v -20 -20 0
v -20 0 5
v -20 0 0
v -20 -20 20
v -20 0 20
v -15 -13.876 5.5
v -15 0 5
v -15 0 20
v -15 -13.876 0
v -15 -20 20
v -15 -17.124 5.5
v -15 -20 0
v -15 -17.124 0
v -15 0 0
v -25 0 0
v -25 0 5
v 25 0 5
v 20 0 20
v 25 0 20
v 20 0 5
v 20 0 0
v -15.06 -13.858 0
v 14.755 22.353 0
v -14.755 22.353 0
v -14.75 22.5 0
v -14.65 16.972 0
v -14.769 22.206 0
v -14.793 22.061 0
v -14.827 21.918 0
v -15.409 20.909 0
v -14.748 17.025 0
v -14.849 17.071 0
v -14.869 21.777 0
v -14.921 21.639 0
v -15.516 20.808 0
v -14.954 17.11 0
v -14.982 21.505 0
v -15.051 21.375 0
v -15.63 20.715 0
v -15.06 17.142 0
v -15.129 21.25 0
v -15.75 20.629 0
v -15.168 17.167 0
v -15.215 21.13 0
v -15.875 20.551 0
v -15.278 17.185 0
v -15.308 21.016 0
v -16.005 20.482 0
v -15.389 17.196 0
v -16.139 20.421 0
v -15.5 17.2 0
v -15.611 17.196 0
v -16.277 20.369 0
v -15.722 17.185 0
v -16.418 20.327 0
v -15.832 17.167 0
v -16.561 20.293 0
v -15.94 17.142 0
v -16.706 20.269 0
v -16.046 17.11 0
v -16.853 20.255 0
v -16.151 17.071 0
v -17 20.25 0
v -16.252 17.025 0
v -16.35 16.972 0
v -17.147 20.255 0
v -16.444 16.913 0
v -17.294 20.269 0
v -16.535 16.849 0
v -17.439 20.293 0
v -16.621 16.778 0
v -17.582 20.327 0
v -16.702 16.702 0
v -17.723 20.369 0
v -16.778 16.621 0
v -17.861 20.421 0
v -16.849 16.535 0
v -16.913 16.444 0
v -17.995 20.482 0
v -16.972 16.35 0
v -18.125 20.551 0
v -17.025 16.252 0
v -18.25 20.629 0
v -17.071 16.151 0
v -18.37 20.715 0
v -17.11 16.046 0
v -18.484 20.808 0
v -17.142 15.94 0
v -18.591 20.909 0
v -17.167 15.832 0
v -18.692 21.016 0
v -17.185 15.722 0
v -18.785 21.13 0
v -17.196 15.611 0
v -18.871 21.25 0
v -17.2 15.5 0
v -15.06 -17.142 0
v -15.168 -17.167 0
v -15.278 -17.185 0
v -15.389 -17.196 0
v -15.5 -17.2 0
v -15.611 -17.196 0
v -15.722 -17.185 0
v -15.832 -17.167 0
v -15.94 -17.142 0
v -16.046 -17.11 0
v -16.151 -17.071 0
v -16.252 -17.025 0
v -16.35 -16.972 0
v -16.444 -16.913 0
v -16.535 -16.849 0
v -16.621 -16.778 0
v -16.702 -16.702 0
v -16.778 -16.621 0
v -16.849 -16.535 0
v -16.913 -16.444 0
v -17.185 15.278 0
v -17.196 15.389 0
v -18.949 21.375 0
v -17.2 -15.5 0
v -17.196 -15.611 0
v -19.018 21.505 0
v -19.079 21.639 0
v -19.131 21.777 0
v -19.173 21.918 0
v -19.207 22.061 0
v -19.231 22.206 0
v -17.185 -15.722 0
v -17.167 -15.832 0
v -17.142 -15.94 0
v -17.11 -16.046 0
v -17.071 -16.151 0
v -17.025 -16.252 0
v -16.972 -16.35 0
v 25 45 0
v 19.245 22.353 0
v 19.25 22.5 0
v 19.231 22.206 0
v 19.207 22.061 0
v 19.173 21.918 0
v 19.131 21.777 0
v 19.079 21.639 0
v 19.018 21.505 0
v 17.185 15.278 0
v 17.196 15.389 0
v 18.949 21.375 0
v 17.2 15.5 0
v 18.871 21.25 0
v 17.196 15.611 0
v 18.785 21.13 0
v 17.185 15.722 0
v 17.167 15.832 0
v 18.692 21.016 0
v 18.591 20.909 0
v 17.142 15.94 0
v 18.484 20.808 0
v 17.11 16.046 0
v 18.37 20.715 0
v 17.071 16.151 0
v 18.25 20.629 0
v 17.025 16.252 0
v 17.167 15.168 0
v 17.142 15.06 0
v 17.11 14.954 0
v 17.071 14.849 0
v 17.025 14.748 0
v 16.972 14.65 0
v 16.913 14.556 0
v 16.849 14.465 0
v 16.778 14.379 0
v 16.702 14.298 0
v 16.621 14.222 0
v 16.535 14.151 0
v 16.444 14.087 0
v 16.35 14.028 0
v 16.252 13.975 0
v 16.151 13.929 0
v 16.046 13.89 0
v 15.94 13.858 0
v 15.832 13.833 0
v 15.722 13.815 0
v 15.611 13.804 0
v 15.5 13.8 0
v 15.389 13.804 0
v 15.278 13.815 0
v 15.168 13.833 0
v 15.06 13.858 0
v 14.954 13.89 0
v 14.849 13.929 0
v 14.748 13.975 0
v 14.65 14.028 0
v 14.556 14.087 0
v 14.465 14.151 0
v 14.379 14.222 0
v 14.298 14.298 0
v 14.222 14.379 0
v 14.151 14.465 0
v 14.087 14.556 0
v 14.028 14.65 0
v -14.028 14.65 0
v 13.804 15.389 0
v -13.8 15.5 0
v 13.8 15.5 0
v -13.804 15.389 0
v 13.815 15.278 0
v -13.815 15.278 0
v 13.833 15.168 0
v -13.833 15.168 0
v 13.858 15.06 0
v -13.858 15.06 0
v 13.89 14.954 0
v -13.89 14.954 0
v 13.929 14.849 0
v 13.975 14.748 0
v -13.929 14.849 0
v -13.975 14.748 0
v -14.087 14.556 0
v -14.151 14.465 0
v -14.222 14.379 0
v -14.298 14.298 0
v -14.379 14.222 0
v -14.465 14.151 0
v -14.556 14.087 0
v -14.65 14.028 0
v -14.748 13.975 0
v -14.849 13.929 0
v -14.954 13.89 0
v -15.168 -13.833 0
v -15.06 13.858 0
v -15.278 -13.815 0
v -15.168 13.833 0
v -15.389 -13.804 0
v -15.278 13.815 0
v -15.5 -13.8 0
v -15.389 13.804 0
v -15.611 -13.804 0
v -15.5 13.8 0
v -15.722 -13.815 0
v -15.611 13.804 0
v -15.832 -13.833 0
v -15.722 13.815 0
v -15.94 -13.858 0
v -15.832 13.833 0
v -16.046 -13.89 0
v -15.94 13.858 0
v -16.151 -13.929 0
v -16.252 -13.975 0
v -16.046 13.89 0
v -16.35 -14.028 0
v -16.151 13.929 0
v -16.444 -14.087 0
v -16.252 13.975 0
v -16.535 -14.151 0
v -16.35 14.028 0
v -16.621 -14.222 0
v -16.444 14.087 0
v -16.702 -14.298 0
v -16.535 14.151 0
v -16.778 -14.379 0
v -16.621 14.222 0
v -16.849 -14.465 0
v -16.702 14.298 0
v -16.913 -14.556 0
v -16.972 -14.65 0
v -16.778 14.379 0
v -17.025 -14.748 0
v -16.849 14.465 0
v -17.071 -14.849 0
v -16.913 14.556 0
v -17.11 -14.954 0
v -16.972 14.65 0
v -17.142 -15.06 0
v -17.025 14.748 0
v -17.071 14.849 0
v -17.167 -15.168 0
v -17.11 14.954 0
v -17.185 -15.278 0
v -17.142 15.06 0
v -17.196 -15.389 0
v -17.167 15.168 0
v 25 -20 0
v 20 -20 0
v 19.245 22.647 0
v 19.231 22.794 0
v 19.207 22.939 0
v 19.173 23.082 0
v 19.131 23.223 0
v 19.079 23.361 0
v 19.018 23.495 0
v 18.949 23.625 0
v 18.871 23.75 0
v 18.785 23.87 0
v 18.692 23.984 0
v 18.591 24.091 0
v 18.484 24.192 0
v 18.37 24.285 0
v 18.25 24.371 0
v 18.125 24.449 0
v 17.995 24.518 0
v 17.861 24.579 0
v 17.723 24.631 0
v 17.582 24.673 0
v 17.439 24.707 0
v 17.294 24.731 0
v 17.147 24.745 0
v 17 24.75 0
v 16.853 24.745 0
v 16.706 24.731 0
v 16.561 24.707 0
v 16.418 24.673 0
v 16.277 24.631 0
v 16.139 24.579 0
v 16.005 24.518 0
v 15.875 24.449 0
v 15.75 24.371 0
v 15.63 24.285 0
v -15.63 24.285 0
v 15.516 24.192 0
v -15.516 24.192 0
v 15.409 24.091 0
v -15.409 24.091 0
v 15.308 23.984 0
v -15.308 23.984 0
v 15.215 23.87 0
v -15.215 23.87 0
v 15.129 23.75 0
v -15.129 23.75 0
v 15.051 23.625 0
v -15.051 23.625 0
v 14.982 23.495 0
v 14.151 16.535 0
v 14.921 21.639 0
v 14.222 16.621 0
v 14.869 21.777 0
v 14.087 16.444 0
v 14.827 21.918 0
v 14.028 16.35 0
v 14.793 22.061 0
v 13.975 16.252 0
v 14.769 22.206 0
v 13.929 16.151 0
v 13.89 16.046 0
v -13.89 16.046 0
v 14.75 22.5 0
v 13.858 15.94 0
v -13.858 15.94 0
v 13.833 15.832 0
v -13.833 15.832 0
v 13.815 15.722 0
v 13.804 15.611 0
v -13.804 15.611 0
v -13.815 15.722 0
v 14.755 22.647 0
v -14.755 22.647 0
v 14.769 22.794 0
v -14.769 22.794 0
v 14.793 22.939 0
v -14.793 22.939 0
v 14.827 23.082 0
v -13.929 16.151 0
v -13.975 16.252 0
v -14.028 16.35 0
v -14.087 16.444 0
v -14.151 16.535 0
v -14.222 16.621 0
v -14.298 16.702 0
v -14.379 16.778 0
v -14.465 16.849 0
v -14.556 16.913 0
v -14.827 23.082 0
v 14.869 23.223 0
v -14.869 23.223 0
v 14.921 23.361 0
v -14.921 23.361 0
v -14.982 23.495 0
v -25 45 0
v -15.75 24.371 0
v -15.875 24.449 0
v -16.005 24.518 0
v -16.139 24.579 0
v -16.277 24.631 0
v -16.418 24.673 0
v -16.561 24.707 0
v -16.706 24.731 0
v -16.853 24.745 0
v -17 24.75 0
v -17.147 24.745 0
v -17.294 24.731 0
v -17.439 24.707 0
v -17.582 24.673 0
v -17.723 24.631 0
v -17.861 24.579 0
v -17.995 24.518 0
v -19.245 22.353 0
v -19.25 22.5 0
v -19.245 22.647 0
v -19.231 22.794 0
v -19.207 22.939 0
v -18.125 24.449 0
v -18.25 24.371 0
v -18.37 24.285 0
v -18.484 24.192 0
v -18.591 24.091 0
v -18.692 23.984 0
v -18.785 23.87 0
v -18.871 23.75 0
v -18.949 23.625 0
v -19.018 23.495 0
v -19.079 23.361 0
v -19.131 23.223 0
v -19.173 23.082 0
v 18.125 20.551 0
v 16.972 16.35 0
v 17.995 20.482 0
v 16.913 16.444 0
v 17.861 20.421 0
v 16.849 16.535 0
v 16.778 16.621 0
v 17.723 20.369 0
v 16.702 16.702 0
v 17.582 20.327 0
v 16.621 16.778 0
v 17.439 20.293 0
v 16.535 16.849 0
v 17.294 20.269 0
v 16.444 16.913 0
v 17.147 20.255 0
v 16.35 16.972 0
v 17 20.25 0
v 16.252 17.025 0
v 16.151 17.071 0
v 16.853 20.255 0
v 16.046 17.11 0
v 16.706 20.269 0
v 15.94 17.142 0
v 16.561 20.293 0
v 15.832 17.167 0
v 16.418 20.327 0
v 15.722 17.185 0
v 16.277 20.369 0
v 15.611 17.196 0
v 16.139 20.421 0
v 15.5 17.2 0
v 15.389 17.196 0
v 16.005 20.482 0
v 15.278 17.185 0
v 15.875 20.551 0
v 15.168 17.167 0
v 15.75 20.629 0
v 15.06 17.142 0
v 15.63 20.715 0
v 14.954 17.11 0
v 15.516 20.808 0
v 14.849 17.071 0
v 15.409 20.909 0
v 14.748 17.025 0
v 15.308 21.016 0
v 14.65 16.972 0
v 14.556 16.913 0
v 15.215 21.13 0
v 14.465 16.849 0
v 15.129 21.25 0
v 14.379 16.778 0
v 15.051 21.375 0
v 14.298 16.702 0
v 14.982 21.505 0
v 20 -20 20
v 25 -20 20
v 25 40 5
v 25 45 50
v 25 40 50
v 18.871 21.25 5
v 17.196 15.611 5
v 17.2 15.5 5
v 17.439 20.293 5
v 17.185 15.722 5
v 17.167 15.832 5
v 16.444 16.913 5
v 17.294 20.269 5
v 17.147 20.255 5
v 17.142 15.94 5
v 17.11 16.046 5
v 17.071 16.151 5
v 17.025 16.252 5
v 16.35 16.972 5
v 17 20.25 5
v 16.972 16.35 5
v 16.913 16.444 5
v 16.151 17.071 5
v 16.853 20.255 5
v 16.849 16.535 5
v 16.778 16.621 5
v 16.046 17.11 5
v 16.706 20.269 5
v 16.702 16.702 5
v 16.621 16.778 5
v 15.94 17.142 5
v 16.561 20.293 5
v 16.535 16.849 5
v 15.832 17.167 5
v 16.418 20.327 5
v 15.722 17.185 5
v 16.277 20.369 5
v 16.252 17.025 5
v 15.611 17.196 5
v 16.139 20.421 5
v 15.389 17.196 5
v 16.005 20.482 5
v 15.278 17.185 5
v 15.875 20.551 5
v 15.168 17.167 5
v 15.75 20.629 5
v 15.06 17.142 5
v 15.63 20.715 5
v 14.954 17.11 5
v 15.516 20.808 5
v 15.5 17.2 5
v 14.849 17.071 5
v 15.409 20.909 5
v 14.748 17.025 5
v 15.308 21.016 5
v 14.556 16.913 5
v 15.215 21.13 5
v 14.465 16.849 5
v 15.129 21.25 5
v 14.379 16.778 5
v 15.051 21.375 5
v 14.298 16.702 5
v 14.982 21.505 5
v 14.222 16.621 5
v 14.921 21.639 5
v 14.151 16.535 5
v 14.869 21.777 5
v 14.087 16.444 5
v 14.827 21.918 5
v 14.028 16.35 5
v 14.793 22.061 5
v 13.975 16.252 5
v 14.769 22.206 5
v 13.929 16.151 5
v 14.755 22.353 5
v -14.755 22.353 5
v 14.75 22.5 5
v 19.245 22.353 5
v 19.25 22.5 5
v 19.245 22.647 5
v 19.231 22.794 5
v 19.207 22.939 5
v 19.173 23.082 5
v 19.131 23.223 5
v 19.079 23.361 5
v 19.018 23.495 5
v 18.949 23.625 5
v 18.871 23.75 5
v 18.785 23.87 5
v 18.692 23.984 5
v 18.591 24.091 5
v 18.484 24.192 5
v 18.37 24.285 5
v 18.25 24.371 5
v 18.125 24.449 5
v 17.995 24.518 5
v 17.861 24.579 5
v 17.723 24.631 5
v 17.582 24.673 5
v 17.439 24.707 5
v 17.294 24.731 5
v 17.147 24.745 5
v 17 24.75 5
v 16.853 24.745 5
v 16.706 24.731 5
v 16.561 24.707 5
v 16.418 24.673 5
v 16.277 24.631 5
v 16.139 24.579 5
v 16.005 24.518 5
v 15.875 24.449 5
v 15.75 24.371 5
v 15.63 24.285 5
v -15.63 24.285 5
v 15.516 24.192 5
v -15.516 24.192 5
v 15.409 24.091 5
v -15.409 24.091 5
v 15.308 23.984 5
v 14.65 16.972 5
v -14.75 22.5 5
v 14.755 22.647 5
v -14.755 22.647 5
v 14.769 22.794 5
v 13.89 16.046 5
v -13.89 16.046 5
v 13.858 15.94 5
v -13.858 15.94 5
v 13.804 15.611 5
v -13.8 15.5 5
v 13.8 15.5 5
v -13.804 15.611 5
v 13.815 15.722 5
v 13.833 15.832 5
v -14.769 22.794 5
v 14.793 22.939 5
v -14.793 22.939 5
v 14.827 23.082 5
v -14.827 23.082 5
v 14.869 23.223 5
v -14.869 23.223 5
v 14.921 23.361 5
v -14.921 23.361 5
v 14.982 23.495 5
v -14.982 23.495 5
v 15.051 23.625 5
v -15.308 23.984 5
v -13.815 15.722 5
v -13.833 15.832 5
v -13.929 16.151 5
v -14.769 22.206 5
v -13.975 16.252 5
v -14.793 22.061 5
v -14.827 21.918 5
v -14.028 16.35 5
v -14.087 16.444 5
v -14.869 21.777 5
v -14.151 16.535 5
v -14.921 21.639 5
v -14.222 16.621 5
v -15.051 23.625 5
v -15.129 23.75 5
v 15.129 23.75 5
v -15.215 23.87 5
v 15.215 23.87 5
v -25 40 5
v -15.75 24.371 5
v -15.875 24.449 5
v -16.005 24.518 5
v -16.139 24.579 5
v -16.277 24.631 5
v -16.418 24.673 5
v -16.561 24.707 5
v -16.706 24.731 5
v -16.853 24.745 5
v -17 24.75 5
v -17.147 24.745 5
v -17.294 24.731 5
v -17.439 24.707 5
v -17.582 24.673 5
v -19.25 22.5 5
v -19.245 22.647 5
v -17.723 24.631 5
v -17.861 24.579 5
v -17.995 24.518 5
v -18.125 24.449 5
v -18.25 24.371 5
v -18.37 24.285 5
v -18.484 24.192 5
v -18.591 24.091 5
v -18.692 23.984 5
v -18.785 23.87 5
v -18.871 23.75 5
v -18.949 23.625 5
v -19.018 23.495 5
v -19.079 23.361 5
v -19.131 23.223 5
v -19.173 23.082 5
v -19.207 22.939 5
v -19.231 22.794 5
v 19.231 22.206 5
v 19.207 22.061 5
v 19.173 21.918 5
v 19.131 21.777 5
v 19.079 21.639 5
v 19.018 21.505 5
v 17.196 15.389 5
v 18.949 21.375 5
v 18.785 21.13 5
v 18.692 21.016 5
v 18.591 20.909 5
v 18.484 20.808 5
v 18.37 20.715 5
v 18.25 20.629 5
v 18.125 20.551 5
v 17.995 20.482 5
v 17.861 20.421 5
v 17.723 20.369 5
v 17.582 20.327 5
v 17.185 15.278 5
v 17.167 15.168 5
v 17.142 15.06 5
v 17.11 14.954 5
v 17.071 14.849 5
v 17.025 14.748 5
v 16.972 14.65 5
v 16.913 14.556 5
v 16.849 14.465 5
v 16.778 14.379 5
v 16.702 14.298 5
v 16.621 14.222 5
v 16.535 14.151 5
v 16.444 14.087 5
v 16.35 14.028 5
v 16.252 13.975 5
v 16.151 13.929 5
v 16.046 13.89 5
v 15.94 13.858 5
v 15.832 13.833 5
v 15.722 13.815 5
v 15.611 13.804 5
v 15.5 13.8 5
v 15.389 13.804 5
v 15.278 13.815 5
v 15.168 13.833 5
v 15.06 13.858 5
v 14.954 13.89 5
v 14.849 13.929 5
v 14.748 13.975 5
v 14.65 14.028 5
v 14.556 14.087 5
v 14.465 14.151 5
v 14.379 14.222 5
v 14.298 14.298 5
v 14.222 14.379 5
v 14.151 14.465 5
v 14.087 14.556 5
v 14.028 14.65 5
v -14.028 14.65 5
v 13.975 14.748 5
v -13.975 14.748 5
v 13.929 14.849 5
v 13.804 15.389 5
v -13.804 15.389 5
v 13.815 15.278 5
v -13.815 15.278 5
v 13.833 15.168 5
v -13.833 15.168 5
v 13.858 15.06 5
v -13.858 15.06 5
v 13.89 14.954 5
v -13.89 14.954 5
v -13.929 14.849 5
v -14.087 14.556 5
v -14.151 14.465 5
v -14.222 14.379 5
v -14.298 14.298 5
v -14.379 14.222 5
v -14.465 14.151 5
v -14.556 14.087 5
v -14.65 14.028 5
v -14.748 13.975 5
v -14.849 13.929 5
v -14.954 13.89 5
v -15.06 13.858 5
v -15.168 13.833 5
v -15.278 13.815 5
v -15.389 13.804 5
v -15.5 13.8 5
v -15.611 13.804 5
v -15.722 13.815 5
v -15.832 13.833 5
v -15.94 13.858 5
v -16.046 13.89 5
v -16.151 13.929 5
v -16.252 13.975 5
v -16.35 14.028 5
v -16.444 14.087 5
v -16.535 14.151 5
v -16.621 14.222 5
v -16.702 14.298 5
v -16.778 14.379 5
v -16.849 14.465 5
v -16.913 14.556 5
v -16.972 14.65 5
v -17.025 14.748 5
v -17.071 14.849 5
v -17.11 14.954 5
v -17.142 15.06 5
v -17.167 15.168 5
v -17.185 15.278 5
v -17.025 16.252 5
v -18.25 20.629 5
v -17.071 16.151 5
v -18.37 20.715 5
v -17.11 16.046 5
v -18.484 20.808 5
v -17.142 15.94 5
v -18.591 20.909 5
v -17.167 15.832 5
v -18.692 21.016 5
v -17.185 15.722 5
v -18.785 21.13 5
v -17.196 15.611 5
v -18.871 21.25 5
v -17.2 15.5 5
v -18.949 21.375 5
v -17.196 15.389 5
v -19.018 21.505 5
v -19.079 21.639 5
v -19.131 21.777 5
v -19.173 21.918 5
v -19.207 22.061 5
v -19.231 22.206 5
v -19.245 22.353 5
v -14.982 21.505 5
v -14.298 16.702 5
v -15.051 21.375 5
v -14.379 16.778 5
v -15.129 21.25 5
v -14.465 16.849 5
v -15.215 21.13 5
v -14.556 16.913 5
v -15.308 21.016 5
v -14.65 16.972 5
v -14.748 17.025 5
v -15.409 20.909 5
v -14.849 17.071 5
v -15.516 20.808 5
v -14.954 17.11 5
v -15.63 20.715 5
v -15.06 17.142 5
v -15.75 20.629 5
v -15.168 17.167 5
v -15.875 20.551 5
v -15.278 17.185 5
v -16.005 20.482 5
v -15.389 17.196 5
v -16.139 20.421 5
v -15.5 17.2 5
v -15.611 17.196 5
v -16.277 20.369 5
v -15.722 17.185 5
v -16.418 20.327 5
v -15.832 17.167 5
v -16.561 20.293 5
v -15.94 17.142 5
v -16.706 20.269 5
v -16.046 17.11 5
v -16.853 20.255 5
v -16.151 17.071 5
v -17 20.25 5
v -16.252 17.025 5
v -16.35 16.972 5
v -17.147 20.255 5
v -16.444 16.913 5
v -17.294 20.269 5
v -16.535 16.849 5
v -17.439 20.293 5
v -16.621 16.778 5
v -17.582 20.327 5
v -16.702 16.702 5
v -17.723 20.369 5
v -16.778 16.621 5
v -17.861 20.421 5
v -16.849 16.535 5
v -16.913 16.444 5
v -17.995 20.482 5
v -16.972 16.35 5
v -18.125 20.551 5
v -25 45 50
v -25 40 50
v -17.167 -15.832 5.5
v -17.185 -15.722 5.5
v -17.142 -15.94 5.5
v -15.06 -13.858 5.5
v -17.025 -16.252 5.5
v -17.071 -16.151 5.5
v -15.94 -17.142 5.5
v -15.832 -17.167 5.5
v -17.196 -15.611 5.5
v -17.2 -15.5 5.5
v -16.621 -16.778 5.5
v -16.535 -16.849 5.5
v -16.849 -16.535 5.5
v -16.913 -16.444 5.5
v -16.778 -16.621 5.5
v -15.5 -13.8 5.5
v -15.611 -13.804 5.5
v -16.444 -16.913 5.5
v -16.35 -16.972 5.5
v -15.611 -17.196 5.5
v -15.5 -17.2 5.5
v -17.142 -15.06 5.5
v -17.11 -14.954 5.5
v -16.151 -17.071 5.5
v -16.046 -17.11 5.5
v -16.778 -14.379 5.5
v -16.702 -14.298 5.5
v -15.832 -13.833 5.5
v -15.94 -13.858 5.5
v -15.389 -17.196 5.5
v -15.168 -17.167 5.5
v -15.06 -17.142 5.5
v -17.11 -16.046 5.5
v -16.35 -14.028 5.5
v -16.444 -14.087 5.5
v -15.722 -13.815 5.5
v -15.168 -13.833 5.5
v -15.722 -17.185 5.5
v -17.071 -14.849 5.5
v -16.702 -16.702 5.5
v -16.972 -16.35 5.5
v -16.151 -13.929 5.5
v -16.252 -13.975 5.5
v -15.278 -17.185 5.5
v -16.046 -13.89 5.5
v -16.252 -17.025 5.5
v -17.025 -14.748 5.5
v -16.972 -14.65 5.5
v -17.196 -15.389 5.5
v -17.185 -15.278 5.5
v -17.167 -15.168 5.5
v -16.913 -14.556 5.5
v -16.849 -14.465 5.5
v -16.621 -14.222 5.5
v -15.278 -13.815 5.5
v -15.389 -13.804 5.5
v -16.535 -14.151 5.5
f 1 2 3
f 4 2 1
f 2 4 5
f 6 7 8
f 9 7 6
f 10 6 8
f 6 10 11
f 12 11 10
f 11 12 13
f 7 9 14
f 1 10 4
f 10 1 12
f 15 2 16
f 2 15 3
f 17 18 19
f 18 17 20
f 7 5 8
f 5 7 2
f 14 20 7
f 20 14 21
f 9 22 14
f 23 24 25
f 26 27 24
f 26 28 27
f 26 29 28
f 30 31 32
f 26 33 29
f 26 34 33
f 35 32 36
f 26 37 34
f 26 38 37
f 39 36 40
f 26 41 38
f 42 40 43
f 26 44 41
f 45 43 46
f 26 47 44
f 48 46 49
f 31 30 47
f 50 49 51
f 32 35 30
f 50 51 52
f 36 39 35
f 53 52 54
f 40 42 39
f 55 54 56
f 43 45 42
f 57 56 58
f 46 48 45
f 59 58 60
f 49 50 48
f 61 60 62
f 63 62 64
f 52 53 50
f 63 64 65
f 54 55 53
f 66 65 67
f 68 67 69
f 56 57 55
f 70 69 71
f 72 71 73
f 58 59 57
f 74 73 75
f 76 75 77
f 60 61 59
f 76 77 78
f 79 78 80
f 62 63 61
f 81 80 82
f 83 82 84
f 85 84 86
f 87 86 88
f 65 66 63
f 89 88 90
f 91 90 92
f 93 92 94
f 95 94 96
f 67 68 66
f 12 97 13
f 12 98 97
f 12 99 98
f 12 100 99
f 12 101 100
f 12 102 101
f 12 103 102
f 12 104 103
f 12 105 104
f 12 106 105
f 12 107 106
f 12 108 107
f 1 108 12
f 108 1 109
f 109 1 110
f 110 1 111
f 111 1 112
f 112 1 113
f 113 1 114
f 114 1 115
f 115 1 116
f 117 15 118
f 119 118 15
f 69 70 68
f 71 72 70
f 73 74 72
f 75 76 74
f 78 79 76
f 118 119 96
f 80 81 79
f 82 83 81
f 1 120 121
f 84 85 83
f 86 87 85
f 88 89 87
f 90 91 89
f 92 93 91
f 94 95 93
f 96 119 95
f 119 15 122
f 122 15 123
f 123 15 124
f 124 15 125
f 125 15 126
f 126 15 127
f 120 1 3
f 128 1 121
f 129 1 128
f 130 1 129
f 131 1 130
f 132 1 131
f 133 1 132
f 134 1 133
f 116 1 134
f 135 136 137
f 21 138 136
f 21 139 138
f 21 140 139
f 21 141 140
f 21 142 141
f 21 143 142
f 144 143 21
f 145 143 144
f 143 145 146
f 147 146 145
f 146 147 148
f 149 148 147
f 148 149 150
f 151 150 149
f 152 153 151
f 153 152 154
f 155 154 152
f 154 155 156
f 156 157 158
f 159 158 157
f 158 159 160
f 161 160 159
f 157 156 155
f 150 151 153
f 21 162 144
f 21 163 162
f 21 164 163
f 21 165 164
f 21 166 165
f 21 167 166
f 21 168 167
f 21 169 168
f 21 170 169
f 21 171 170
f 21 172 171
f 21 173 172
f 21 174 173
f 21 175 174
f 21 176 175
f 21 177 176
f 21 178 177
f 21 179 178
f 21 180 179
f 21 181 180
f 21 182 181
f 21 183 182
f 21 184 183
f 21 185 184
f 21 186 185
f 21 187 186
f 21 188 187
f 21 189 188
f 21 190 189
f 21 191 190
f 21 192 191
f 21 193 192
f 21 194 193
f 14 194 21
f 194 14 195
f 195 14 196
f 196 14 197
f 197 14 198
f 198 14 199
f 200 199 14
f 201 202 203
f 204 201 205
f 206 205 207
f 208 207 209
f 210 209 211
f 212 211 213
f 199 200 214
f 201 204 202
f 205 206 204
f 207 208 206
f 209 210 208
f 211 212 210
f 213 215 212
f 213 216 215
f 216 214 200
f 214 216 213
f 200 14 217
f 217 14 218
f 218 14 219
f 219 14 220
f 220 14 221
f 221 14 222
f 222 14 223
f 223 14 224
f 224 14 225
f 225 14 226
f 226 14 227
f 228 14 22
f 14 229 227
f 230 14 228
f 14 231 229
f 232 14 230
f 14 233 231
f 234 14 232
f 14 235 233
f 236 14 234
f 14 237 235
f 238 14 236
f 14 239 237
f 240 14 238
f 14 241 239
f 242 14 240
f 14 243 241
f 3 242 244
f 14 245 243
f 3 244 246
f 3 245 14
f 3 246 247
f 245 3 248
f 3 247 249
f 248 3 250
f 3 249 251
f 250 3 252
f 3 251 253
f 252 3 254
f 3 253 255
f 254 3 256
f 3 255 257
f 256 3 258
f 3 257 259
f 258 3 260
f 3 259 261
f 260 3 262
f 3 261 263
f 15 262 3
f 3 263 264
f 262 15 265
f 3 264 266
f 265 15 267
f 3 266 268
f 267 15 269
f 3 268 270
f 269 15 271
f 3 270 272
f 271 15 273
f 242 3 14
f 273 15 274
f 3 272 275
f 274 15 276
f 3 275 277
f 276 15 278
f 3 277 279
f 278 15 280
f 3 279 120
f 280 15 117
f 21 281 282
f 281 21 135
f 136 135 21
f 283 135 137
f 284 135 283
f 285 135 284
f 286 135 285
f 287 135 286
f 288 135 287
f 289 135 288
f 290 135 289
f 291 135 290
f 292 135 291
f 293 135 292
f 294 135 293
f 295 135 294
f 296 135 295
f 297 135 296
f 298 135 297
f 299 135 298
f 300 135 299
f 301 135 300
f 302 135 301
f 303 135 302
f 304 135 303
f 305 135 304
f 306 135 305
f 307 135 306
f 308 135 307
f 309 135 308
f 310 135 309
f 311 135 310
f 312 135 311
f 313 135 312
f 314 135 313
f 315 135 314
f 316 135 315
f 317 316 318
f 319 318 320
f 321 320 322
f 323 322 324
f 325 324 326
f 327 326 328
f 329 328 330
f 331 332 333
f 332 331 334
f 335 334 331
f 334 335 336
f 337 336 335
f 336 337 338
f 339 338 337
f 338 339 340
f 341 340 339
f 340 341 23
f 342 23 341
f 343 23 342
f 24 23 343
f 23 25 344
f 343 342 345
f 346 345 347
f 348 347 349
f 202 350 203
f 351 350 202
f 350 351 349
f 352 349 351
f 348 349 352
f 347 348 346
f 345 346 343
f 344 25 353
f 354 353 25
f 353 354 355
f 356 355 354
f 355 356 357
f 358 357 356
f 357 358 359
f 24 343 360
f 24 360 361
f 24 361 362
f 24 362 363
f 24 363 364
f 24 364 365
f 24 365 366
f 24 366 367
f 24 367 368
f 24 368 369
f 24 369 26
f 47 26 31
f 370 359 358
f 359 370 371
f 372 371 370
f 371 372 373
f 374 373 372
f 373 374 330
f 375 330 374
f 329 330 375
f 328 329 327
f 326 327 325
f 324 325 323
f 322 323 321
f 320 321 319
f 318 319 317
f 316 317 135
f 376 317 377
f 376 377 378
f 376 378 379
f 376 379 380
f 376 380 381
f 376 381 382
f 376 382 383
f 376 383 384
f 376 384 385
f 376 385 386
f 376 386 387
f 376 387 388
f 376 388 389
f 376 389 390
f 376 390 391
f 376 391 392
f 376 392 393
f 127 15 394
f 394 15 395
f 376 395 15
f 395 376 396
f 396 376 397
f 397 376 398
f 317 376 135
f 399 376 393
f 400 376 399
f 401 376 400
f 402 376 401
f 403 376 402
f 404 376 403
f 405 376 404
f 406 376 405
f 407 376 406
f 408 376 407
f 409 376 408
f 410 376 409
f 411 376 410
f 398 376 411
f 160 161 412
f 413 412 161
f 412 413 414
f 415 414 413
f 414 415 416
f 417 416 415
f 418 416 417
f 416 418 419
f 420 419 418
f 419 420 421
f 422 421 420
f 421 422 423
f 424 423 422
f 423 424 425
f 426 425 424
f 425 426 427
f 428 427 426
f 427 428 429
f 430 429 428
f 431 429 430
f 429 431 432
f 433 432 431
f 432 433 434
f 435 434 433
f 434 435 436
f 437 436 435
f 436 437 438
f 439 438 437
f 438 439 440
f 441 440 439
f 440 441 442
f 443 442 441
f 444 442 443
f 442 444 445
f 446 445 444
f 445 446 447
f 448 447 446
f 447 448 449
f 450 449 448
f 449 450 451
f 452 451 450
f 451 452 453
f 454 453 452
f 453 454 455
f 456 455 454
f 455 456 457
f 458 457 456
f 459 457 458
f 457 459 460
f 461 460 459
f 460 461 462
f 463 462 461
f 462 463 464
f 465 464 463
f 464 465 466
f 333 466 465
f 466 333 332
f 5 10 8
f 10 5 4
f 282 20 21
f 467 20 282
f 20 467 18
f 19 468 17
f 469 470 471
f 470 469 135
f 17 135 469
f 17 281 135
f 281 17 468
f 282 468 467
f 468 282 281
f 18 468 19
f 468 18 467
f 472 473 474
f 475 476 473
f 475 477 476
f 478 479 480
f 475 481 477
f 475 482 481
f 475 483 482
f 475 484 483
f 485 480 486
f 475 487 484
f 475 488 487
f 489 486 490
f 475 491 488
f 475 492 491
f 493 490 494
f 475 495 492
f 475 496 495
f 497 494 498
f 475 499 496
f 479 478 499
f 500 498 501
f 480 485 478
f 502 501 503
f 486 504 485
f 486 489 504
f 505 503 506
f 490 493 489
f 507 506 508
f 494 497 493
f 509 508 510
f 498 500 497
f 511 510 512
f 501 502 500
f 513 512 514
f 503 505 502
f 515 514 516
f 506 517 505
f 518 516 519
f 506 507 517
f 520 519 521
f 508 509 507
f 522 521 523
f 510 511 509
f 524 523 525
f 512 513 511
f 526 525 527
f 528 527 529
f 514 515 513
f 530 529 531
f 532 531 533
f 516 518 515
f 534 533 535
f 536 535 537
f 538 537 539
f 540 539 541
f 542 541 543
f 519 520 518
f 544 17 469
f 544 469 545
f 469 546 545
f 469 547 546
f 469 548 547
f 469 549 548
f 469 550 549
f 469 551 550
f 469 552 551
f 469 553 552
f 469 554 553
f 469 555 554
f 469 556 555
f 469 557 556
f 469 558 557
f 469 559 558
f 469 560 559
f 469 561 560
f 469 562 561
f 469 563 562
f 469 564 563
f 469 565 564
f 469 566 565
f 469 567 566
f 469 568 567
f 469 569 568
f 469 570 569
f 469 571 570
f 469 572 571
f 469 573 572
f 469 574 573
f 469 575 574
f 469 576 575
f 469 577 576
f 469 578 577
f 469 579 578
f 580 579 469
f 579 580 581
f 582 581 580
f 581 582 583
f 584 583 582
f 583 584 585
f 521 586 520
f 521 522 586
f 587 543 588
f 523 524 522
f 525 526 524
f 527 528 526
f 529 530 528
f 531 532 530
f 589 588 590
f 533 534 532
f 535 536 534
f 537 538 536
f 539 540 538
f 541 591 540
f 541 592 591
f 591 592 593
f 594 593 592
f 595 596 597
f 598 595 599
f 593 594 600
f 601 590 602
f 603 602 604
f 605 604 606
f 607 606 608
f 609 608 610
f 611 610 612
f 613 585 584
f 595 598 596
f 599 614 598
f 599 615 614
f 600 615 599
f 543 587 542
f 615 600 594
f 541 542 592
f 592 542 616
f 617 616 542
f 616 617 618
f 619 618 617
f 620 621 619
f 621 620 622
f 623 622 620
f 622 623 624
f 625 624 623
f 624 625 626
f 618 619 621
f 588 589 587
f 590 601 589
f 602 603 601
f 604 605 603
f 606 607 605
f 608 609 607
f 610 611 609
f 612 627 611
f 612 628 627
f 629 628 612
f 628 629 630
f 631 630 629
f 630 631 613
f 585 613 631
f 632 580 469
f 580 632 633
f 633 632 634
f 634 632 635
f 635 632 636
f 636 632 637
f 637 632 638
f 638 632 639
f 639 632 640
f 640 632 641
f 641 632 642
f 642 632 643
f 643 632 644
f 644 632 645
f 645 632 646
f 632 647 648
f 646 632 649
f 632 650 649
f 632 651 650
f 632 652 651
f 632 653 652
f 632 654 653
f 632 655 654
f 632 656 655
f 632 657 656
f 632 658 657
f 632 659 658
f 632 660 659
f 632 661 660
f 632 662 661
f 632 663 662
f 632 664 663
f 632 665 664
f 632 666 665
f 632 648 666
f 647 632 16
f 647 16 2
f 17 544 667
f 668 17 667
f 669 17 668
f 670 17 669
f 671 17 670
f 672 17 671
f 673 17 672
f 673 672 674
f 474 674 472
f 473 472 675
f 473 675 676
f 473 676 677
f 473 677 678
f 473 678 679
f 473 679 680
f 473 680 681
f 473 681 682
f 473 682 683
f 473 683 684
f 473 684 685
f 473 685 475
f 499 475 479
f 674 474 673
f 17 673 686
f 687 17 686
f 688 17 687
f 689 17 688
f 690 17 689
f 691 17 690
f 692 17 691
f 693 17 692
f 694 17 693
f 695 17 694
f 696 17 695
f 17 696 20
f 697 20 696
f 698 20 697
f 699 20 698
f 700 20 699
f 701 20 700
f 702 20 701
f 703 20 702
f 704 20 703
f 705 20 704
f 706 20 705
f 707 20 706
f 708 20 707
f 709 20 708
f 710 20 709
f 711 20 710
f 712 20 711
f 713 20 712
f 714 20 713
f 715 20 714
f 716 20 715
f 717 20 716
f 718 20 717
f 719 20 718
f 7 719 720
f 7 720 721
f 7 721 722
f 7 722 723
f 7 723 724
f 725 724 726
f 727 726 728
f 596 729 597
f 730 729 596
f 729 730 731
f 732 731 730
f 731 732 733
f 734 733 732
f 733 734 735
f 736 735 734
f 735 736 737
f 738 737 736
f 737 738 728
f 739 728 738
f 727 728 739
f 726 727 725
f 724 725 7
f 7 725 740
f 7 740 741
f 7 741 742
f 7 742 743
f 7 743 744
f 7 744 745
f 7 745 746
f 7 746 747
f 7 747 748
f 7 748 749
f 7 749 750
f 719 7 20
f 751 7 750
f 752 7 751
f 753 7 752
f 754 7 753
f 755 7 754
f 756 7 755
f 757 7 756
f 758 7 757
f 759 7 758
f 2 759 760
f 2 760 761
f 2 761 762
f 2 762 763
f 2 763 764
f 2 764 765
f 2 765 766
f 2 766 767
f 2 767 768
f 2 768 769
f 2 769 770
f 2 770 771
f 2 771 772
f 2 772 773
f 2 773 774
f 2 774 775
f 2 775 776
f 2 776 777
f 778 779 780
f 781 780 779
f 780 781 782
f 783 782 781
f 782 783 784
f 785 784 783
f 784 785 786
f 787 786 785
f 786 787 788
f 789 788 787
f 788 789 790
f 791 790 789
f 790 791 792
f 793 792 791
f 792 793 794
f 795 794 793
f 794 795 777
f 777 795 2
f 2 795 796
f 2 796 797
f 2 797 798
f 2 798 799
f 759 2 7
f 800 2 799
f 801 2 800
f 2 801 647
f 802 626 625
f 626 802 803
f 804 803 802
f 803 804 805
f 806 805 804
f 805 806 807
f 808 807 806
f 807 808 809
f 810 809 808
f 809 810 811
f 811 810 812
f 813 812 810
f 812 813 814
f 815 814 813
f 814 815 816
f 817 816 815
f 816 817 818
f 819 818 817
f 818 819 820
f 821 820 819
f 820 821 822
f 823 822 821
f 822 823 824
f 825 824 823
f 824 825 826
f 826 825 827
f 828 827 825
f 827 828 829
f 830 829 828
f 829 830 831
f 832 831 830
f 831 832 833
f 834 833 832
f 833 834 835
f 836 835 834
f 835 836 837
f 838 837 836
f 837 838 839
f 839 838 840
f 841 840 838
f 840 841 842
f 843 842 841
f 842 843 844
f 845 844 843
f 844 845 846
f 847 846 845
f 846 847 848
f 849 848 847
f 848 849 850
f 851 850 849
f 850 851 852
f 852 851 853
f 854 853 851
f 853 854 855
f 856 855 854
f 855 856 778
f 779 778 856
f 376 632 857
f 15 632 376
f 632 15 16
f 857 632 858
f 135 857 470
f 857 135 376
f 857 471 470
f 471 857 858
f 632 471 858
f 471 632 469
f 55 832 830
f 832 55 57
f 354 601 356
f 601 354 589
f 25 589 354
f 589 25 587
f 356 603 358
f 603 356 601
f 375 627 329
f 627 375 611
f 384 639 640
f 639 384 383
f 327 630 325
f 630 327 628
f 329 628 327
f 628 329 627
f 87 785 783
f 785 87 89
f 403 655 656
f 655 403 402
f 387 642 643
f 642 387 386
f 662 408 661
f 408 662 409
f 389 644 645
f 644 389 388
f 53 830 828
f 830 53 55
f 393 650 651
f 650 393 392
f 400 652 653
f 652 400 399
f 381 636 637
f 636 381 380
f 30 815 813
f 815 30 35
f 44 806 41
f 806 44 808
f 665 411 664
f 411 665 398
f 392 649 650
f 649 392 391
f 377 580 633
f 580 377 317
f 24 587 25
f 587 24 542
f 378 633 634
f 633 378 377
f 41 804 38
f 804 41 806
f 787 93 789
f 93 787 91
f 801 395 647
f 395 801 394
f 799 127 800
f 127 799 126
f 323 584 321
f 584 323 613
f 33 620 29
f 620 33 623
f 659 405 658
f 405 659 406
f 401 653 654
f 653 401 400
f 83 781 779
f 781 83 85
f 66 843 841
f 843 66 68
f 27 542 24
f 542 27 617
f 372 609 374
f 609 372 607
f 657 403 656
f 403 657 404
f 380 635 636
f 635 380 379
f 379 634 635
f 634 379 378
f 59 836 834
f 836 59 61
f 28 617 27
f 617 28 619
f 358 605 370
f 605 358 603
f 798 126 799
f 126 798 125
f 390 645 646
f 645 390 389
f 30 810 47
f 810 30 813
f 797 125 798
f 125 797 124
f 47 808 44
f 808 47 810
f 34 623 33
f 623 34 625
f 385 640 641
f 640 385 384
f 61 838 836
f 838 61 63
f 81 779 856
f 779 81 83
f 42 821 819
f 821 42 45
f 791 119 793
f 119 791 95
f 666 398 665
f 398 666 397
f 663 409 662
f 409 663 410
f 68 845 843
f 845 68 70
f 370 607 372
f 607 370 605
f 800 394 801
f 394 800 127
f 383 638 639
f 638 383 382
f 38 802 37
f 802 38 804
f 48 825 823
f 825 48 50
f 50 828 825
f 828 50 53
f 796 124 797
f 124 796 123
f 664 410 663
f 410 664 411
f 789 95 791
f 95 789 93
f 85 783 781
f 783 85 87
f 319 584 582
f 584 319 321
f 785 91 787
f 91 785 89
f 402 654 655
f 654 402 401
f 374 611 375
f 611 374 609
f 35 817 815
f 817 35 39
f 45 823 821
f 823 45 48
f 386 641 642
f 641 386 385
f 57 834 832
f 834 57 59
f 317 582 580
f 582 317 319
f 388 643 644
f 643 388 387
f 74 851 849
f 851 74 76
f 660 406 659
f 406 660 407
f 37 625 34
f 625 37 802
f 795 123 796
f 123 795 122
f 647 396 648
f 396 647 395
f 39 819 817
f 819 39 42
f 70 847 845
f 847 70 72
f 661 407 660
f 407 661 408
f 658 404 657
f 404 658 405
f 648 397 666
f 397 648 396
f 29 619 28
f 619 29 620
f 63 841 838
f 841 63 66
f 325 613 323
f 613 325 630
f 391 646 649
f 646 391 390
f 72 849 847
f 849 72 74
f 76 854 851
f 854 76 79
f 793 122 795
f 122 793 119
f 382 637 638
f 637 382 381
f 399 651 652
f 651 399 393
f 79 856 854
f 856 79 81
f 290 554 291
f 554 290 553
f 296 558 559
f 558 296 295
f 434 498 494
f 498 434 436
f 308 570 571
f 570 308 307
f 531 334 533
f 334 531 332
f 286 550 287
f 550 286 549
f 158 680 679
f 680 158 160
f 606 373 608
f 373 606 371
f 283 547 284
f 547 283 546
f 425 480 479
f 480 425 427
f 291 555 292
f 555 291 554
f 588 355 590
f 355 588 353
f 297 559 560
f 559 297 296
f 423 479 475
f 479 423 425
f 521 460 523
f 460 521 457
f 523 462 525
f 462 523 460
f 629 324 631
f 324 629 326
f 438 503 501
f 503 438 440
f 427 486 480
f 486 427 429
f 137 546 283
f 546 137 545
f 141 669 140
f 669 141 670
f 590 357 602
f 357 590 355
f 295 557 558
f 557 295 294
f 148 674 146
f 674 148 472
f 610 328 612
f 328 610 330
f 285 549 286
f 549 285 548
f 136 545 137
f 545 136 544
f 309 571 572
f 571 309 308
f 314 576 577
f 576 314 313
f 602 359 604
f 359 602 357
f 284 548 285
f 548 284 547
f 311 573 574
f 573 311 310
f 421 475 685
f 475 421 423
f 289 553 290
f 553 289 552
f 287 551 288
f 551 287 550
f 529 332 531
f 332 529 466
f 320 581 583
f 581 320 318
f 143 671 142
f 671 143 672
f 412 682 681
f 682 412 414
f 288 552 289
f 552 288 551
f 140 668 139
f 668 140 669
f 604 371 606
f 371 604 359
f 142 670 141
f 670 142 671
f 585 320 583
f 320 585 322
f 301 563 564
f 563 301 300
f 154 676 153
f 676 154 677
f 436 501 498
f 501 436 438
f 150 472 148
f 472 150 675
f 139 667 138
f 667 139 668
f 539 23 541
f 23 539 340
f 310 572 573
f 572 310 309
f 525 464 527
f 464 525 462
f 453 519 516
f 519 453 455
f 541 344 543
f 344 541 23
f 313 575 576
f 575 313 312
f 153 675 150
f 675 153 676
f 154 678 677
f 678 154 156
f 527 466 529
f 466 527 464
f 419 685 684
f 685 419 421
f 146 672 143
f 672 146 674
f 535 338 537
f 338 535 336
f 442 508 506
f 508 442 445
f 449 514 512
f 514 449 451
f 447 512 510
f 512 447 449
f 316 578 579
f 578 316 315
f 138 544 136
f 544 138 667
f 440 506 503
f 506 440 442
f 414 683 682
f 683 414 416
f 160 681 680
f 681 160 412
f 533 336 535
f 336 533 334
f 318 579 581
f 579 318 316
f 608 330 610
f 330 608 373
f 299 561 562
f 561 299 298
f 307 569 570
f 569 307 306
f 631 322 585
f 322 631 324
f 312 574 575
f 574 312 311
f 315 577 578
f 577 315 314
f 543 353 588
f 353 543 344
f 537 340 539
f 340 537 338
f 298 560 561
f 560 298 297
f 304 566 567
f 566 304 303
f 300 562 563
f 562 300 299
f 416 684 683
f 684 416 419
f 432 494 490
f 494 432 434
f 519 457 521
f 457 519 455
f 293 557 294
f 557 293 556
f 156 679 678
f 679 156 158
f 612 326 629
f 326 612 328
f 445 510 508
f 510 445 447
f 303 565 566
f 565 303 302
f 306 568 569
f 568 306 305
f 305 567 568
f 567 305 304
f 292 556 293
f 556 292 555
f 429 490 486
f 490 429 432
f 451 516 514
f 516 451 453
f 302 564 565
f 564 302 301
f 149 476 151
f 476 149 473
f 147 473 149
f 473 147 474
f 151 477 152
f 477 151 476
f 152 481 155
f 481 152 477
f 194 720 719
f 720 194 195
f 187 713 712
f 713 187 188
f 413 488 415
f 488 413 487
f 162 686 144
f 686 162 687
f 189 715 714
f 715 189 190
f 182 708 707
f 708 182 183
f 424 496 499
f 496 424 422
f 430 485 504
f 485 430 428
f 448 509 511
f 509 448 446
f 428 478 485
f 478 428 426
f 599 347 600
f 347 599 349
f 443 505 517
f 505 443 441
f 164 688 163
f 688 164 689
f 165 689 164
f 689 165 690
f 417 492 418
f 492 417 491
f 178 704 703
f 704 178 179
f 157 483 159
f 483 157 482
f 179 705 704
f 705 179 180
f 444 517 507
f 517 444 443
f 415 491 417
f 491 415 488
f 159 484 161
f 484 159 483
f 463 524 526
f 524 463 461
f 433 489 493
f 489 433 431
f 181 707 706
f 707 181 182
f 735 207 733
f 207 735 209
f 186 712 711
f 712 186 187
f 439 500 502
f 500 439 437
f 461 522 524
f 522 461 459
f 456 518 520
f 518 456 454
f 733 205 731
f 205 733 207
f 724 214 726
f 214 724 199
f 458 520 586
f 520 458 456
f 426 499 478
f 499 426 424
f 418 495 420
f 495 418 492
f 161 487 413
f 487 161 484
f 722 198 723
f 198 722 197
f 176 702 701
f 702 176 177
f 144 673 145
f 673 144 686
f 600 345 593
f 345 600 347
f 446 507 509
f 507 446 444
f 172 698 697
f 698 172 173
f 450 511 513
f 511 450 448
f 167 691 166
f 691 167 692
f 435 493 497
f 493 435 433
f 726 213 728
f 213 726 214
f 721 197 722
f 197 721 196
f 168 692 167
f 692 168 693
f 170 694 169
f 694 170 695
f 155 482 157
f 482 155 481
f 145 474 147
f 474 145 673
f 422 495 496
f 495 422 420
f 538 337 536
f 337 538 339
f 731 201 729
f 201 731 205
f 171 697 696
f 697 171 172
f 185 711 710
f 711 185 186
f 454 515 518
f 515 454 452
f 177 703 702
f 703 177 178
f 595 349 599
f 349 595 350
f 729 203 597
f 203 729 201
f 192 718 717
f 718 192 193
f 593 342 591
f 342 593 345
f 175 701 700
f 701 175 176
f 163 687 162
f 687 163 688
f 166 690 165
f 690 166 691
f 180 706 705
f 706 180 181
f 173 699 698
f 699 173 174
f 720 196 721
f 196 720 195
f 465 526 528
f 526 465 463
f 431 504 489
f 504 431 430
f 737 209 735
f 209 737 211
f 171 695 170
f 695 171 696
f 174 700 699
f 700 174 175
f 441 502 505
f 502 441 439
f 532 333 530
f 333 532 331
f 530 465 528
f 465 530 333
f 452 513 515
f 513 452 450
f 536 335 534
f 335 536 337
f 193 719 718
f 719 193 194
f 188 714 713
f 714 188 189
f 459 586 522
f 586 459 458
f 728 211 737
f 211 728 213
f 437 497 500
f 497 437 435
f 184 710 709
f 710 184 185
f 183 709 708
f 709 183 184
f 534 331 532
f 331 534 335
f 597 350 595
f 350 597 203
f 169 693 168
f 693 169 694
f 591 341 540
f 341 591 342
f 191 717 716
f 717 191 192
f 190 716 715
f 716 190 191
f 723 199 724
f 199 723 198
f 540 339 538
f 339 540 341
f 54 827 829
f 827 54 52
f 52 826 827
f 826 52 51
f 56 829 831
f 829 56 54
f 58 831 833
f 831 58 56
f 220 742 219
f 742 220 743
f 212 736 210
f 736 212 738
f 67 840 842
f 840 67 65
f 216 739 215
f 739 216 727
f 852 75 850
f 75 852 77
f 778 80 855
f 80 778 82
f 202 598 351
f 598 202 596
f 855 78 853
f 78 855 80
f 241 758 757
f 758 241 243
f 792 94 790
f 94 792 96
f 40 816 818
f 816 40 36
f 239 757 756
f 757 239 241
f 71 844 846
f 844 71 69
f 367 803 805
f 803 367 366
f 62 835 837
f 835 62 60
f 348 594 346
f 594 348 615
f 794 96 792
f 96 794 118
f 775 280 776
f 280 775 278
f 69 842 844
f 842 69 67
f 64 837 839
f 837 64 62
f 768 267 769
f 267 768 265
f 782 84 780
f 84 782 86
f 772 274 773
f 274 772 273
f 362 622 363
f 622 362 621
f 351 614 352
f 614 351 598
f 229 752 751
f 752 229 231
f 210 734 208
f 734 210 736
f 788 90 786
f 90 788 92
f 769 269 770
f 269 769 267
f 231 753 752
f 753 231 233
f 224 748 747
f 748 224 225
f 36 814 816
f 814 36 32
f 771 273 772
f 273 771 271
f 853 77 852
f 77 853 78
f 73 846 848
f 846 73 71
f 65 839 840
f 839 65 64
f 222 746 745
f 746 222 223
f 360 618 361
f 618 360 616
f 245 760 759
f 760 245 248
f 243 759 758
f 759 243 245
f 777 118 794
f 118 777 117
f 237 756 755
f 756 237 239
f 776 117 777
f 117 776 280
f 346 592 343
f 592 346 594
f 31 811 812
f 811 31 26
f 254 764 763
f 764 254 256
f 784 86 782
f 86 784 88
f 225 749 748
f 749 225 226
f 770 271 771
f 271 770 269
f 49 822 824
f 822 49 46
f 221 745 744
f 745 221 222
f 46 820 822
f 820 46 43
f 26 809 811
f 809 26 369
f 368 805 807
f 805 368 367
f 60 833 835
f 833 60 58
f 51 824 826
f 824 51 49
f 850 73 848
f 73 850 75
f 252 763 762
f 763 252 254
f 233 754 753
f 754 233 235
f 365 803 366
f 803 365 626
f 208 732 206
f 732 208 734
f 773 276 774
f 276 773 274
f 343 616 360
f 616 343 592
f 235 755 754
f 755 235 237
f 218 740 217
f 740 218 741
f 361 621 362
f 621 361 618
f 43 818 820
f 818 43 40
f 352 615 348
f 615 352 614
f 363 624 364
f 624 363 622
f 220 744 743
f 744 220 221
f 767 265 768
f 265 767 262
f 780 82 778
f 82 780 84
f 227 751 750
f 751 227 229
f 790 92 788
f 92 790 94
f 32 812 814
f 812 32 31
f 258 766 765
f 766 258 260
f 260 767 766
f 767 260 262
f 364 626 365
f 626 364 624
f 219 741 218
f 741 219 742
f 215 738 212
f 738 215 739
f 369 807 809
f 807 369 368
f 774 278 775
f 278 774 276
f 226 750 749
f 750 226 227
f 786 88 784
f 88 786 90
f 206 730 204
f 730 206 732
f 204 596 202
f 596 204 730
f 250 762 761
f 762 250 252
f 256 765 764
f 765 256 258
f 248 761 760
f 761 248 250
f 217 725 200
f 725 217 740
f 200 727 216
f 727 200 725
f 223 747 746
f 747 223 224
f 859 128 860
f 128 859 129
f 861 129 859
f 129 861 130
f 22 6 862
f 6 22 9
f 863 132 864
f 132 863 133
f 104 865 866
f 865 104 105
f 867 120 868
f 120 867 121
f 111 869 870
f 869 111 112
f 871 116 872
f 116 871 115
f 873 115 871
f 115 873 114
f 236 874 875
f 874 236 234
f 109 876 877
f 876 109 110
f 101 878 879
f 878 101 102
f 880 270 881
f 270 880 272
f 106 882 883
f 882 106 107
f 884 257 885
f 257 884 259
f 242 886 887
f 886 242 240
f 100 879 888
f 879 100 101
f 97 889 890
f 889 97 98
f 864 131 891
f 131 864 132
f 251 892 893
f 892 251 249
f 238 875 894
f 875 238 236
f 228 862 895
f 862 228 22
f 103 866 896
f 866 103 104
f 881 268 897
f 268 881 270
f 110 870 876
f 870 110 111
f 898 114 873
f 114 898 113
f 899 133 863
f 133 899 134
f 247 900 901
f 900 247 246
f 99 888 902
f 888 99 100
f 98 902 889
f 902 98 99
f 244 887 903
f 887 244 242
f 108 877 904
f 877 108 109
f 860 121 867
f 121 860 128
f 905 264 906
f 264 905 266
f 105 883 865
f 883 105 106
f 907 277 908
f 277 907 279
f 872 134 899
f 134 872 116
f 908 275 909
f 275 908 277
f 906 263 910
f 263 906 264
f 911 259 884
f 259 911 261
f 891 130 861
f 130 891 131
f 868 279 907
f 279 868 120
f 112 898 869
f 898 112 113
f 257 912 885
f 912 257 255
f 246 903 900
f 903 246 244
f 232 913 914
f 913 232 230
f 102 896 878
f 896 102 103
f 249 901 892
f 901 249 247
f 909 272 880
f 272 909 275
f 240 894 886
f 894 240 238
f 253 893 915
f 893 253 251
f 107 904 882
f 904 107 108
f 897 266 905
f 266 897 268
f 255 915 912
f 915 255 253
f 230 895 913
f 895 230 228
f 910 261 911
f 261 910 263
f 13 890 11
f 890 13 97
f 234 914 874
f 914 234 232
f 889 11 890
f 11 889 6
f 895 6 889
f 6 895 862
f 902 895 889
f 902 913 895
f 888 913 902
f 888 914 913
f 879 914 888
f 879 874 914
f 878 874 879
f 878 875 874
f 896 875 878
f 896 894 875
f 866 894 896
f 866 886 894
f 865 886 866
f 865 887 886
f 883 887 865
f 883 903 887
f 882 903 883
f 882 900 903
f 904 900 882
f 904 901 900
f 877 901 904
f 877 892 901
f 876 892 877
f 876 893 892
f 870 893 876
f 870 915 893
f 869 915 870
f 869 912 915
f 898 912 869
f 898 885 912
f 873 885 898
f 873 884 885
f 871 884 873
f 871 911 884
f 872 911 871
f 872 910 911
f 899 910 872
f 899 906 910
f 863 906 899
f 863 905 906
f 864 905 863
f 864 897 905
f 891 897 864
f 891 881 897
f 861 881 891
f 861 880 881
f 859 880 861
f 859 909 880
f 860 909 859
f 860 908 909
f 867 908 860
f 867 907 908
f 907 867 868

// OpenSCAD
// L-shaped mounting bracket for a NEMA 17 stepper motor (e.g. syringe pump)
// Print orientation: base plate on the bed, motor plate building upward (+Z)

// ---------------- Parameters ----------------
plate_x      = 25;    // base plate half-length in X (mm)
plate_y      = 45;    // base plate length in Y (mm)
plate_t      = 5;     // base plate thickness (mm)

motor_h      = 50;    // motor plate height (mm)
motor_w      = 5;     // motor plate thickness in Y (mm)

boss_d       = 23;    // motor centring boss hole diameter (mm)
boss_x       = 0;     // boss hole centre X (mm)
boss_z       = 28;    // boss hole centre Z (mm)

screw_d      = 3.4;   // M3 screw hole diameter (mm)
screw_pitch  = 31;    // square pattern pitch for screw holes (mm)

gusset_t     = 5;     // gusset thickness along X (mm)
gusset_leg   = 20;    // gusset leg length along +Y and +Z (mm)

eps          = 0.5;   // cutter overshoot past faces (mm)
$fn          = 96;    // curve resolution

// ---------------- Model ----------------
difference() {
    union() {
        // Base plate
        translate([-plate_x, 0, 0])
            cube([plate_x * 2, plate_y, plate_t]);

        // Vertical motor plate, standing on the back edge of the base
        translate([-plate_x, plate_y - motor_w, 0])
            cube([plate_x * 2, motor_w, motor_h]);

        // Triangular gussets, flush with left and right edges
        // Right triangle in YZ plane: legs along +Y and +Z, right angle at (y=5, z=5)
        for (sx = [-1, 1])
            rotate([90, 0, 0])
                translate([sx * (plate_x - gusset_t), 0, 0])
                    cube([gusset_t, gusset_leg, gusset_leg]);
    }

    // Base plate through-holes (M4) at (x = -17, y = 30) and (x = 17, y = 30)
    for (x = [-17, 17])
        translate([x, plate_y / 2, -eps])
            cylinder(d = 4.5, h = plate_t + 2 * eps);

    // Motor plate hole for the centring boss, along Y, centred at (x = 0, z = 28)
    translate([boss_x, -eps, boss_z])
        cylinder(d = boss_d, h = motor_w + 2 * eps);

    // Four M3 screw holes on a 31 mm square pattern, centred on the boss hole
    for (a = [0, 90, 180, 270])
        rotate([0, 0, a])
            translate([screw_pitch / 2, screw_pitch / 2, 0])
                translate([0, 0, -eps])
                    cylinder(d = screw_d, h = motor_w + 2 * eps);
}
